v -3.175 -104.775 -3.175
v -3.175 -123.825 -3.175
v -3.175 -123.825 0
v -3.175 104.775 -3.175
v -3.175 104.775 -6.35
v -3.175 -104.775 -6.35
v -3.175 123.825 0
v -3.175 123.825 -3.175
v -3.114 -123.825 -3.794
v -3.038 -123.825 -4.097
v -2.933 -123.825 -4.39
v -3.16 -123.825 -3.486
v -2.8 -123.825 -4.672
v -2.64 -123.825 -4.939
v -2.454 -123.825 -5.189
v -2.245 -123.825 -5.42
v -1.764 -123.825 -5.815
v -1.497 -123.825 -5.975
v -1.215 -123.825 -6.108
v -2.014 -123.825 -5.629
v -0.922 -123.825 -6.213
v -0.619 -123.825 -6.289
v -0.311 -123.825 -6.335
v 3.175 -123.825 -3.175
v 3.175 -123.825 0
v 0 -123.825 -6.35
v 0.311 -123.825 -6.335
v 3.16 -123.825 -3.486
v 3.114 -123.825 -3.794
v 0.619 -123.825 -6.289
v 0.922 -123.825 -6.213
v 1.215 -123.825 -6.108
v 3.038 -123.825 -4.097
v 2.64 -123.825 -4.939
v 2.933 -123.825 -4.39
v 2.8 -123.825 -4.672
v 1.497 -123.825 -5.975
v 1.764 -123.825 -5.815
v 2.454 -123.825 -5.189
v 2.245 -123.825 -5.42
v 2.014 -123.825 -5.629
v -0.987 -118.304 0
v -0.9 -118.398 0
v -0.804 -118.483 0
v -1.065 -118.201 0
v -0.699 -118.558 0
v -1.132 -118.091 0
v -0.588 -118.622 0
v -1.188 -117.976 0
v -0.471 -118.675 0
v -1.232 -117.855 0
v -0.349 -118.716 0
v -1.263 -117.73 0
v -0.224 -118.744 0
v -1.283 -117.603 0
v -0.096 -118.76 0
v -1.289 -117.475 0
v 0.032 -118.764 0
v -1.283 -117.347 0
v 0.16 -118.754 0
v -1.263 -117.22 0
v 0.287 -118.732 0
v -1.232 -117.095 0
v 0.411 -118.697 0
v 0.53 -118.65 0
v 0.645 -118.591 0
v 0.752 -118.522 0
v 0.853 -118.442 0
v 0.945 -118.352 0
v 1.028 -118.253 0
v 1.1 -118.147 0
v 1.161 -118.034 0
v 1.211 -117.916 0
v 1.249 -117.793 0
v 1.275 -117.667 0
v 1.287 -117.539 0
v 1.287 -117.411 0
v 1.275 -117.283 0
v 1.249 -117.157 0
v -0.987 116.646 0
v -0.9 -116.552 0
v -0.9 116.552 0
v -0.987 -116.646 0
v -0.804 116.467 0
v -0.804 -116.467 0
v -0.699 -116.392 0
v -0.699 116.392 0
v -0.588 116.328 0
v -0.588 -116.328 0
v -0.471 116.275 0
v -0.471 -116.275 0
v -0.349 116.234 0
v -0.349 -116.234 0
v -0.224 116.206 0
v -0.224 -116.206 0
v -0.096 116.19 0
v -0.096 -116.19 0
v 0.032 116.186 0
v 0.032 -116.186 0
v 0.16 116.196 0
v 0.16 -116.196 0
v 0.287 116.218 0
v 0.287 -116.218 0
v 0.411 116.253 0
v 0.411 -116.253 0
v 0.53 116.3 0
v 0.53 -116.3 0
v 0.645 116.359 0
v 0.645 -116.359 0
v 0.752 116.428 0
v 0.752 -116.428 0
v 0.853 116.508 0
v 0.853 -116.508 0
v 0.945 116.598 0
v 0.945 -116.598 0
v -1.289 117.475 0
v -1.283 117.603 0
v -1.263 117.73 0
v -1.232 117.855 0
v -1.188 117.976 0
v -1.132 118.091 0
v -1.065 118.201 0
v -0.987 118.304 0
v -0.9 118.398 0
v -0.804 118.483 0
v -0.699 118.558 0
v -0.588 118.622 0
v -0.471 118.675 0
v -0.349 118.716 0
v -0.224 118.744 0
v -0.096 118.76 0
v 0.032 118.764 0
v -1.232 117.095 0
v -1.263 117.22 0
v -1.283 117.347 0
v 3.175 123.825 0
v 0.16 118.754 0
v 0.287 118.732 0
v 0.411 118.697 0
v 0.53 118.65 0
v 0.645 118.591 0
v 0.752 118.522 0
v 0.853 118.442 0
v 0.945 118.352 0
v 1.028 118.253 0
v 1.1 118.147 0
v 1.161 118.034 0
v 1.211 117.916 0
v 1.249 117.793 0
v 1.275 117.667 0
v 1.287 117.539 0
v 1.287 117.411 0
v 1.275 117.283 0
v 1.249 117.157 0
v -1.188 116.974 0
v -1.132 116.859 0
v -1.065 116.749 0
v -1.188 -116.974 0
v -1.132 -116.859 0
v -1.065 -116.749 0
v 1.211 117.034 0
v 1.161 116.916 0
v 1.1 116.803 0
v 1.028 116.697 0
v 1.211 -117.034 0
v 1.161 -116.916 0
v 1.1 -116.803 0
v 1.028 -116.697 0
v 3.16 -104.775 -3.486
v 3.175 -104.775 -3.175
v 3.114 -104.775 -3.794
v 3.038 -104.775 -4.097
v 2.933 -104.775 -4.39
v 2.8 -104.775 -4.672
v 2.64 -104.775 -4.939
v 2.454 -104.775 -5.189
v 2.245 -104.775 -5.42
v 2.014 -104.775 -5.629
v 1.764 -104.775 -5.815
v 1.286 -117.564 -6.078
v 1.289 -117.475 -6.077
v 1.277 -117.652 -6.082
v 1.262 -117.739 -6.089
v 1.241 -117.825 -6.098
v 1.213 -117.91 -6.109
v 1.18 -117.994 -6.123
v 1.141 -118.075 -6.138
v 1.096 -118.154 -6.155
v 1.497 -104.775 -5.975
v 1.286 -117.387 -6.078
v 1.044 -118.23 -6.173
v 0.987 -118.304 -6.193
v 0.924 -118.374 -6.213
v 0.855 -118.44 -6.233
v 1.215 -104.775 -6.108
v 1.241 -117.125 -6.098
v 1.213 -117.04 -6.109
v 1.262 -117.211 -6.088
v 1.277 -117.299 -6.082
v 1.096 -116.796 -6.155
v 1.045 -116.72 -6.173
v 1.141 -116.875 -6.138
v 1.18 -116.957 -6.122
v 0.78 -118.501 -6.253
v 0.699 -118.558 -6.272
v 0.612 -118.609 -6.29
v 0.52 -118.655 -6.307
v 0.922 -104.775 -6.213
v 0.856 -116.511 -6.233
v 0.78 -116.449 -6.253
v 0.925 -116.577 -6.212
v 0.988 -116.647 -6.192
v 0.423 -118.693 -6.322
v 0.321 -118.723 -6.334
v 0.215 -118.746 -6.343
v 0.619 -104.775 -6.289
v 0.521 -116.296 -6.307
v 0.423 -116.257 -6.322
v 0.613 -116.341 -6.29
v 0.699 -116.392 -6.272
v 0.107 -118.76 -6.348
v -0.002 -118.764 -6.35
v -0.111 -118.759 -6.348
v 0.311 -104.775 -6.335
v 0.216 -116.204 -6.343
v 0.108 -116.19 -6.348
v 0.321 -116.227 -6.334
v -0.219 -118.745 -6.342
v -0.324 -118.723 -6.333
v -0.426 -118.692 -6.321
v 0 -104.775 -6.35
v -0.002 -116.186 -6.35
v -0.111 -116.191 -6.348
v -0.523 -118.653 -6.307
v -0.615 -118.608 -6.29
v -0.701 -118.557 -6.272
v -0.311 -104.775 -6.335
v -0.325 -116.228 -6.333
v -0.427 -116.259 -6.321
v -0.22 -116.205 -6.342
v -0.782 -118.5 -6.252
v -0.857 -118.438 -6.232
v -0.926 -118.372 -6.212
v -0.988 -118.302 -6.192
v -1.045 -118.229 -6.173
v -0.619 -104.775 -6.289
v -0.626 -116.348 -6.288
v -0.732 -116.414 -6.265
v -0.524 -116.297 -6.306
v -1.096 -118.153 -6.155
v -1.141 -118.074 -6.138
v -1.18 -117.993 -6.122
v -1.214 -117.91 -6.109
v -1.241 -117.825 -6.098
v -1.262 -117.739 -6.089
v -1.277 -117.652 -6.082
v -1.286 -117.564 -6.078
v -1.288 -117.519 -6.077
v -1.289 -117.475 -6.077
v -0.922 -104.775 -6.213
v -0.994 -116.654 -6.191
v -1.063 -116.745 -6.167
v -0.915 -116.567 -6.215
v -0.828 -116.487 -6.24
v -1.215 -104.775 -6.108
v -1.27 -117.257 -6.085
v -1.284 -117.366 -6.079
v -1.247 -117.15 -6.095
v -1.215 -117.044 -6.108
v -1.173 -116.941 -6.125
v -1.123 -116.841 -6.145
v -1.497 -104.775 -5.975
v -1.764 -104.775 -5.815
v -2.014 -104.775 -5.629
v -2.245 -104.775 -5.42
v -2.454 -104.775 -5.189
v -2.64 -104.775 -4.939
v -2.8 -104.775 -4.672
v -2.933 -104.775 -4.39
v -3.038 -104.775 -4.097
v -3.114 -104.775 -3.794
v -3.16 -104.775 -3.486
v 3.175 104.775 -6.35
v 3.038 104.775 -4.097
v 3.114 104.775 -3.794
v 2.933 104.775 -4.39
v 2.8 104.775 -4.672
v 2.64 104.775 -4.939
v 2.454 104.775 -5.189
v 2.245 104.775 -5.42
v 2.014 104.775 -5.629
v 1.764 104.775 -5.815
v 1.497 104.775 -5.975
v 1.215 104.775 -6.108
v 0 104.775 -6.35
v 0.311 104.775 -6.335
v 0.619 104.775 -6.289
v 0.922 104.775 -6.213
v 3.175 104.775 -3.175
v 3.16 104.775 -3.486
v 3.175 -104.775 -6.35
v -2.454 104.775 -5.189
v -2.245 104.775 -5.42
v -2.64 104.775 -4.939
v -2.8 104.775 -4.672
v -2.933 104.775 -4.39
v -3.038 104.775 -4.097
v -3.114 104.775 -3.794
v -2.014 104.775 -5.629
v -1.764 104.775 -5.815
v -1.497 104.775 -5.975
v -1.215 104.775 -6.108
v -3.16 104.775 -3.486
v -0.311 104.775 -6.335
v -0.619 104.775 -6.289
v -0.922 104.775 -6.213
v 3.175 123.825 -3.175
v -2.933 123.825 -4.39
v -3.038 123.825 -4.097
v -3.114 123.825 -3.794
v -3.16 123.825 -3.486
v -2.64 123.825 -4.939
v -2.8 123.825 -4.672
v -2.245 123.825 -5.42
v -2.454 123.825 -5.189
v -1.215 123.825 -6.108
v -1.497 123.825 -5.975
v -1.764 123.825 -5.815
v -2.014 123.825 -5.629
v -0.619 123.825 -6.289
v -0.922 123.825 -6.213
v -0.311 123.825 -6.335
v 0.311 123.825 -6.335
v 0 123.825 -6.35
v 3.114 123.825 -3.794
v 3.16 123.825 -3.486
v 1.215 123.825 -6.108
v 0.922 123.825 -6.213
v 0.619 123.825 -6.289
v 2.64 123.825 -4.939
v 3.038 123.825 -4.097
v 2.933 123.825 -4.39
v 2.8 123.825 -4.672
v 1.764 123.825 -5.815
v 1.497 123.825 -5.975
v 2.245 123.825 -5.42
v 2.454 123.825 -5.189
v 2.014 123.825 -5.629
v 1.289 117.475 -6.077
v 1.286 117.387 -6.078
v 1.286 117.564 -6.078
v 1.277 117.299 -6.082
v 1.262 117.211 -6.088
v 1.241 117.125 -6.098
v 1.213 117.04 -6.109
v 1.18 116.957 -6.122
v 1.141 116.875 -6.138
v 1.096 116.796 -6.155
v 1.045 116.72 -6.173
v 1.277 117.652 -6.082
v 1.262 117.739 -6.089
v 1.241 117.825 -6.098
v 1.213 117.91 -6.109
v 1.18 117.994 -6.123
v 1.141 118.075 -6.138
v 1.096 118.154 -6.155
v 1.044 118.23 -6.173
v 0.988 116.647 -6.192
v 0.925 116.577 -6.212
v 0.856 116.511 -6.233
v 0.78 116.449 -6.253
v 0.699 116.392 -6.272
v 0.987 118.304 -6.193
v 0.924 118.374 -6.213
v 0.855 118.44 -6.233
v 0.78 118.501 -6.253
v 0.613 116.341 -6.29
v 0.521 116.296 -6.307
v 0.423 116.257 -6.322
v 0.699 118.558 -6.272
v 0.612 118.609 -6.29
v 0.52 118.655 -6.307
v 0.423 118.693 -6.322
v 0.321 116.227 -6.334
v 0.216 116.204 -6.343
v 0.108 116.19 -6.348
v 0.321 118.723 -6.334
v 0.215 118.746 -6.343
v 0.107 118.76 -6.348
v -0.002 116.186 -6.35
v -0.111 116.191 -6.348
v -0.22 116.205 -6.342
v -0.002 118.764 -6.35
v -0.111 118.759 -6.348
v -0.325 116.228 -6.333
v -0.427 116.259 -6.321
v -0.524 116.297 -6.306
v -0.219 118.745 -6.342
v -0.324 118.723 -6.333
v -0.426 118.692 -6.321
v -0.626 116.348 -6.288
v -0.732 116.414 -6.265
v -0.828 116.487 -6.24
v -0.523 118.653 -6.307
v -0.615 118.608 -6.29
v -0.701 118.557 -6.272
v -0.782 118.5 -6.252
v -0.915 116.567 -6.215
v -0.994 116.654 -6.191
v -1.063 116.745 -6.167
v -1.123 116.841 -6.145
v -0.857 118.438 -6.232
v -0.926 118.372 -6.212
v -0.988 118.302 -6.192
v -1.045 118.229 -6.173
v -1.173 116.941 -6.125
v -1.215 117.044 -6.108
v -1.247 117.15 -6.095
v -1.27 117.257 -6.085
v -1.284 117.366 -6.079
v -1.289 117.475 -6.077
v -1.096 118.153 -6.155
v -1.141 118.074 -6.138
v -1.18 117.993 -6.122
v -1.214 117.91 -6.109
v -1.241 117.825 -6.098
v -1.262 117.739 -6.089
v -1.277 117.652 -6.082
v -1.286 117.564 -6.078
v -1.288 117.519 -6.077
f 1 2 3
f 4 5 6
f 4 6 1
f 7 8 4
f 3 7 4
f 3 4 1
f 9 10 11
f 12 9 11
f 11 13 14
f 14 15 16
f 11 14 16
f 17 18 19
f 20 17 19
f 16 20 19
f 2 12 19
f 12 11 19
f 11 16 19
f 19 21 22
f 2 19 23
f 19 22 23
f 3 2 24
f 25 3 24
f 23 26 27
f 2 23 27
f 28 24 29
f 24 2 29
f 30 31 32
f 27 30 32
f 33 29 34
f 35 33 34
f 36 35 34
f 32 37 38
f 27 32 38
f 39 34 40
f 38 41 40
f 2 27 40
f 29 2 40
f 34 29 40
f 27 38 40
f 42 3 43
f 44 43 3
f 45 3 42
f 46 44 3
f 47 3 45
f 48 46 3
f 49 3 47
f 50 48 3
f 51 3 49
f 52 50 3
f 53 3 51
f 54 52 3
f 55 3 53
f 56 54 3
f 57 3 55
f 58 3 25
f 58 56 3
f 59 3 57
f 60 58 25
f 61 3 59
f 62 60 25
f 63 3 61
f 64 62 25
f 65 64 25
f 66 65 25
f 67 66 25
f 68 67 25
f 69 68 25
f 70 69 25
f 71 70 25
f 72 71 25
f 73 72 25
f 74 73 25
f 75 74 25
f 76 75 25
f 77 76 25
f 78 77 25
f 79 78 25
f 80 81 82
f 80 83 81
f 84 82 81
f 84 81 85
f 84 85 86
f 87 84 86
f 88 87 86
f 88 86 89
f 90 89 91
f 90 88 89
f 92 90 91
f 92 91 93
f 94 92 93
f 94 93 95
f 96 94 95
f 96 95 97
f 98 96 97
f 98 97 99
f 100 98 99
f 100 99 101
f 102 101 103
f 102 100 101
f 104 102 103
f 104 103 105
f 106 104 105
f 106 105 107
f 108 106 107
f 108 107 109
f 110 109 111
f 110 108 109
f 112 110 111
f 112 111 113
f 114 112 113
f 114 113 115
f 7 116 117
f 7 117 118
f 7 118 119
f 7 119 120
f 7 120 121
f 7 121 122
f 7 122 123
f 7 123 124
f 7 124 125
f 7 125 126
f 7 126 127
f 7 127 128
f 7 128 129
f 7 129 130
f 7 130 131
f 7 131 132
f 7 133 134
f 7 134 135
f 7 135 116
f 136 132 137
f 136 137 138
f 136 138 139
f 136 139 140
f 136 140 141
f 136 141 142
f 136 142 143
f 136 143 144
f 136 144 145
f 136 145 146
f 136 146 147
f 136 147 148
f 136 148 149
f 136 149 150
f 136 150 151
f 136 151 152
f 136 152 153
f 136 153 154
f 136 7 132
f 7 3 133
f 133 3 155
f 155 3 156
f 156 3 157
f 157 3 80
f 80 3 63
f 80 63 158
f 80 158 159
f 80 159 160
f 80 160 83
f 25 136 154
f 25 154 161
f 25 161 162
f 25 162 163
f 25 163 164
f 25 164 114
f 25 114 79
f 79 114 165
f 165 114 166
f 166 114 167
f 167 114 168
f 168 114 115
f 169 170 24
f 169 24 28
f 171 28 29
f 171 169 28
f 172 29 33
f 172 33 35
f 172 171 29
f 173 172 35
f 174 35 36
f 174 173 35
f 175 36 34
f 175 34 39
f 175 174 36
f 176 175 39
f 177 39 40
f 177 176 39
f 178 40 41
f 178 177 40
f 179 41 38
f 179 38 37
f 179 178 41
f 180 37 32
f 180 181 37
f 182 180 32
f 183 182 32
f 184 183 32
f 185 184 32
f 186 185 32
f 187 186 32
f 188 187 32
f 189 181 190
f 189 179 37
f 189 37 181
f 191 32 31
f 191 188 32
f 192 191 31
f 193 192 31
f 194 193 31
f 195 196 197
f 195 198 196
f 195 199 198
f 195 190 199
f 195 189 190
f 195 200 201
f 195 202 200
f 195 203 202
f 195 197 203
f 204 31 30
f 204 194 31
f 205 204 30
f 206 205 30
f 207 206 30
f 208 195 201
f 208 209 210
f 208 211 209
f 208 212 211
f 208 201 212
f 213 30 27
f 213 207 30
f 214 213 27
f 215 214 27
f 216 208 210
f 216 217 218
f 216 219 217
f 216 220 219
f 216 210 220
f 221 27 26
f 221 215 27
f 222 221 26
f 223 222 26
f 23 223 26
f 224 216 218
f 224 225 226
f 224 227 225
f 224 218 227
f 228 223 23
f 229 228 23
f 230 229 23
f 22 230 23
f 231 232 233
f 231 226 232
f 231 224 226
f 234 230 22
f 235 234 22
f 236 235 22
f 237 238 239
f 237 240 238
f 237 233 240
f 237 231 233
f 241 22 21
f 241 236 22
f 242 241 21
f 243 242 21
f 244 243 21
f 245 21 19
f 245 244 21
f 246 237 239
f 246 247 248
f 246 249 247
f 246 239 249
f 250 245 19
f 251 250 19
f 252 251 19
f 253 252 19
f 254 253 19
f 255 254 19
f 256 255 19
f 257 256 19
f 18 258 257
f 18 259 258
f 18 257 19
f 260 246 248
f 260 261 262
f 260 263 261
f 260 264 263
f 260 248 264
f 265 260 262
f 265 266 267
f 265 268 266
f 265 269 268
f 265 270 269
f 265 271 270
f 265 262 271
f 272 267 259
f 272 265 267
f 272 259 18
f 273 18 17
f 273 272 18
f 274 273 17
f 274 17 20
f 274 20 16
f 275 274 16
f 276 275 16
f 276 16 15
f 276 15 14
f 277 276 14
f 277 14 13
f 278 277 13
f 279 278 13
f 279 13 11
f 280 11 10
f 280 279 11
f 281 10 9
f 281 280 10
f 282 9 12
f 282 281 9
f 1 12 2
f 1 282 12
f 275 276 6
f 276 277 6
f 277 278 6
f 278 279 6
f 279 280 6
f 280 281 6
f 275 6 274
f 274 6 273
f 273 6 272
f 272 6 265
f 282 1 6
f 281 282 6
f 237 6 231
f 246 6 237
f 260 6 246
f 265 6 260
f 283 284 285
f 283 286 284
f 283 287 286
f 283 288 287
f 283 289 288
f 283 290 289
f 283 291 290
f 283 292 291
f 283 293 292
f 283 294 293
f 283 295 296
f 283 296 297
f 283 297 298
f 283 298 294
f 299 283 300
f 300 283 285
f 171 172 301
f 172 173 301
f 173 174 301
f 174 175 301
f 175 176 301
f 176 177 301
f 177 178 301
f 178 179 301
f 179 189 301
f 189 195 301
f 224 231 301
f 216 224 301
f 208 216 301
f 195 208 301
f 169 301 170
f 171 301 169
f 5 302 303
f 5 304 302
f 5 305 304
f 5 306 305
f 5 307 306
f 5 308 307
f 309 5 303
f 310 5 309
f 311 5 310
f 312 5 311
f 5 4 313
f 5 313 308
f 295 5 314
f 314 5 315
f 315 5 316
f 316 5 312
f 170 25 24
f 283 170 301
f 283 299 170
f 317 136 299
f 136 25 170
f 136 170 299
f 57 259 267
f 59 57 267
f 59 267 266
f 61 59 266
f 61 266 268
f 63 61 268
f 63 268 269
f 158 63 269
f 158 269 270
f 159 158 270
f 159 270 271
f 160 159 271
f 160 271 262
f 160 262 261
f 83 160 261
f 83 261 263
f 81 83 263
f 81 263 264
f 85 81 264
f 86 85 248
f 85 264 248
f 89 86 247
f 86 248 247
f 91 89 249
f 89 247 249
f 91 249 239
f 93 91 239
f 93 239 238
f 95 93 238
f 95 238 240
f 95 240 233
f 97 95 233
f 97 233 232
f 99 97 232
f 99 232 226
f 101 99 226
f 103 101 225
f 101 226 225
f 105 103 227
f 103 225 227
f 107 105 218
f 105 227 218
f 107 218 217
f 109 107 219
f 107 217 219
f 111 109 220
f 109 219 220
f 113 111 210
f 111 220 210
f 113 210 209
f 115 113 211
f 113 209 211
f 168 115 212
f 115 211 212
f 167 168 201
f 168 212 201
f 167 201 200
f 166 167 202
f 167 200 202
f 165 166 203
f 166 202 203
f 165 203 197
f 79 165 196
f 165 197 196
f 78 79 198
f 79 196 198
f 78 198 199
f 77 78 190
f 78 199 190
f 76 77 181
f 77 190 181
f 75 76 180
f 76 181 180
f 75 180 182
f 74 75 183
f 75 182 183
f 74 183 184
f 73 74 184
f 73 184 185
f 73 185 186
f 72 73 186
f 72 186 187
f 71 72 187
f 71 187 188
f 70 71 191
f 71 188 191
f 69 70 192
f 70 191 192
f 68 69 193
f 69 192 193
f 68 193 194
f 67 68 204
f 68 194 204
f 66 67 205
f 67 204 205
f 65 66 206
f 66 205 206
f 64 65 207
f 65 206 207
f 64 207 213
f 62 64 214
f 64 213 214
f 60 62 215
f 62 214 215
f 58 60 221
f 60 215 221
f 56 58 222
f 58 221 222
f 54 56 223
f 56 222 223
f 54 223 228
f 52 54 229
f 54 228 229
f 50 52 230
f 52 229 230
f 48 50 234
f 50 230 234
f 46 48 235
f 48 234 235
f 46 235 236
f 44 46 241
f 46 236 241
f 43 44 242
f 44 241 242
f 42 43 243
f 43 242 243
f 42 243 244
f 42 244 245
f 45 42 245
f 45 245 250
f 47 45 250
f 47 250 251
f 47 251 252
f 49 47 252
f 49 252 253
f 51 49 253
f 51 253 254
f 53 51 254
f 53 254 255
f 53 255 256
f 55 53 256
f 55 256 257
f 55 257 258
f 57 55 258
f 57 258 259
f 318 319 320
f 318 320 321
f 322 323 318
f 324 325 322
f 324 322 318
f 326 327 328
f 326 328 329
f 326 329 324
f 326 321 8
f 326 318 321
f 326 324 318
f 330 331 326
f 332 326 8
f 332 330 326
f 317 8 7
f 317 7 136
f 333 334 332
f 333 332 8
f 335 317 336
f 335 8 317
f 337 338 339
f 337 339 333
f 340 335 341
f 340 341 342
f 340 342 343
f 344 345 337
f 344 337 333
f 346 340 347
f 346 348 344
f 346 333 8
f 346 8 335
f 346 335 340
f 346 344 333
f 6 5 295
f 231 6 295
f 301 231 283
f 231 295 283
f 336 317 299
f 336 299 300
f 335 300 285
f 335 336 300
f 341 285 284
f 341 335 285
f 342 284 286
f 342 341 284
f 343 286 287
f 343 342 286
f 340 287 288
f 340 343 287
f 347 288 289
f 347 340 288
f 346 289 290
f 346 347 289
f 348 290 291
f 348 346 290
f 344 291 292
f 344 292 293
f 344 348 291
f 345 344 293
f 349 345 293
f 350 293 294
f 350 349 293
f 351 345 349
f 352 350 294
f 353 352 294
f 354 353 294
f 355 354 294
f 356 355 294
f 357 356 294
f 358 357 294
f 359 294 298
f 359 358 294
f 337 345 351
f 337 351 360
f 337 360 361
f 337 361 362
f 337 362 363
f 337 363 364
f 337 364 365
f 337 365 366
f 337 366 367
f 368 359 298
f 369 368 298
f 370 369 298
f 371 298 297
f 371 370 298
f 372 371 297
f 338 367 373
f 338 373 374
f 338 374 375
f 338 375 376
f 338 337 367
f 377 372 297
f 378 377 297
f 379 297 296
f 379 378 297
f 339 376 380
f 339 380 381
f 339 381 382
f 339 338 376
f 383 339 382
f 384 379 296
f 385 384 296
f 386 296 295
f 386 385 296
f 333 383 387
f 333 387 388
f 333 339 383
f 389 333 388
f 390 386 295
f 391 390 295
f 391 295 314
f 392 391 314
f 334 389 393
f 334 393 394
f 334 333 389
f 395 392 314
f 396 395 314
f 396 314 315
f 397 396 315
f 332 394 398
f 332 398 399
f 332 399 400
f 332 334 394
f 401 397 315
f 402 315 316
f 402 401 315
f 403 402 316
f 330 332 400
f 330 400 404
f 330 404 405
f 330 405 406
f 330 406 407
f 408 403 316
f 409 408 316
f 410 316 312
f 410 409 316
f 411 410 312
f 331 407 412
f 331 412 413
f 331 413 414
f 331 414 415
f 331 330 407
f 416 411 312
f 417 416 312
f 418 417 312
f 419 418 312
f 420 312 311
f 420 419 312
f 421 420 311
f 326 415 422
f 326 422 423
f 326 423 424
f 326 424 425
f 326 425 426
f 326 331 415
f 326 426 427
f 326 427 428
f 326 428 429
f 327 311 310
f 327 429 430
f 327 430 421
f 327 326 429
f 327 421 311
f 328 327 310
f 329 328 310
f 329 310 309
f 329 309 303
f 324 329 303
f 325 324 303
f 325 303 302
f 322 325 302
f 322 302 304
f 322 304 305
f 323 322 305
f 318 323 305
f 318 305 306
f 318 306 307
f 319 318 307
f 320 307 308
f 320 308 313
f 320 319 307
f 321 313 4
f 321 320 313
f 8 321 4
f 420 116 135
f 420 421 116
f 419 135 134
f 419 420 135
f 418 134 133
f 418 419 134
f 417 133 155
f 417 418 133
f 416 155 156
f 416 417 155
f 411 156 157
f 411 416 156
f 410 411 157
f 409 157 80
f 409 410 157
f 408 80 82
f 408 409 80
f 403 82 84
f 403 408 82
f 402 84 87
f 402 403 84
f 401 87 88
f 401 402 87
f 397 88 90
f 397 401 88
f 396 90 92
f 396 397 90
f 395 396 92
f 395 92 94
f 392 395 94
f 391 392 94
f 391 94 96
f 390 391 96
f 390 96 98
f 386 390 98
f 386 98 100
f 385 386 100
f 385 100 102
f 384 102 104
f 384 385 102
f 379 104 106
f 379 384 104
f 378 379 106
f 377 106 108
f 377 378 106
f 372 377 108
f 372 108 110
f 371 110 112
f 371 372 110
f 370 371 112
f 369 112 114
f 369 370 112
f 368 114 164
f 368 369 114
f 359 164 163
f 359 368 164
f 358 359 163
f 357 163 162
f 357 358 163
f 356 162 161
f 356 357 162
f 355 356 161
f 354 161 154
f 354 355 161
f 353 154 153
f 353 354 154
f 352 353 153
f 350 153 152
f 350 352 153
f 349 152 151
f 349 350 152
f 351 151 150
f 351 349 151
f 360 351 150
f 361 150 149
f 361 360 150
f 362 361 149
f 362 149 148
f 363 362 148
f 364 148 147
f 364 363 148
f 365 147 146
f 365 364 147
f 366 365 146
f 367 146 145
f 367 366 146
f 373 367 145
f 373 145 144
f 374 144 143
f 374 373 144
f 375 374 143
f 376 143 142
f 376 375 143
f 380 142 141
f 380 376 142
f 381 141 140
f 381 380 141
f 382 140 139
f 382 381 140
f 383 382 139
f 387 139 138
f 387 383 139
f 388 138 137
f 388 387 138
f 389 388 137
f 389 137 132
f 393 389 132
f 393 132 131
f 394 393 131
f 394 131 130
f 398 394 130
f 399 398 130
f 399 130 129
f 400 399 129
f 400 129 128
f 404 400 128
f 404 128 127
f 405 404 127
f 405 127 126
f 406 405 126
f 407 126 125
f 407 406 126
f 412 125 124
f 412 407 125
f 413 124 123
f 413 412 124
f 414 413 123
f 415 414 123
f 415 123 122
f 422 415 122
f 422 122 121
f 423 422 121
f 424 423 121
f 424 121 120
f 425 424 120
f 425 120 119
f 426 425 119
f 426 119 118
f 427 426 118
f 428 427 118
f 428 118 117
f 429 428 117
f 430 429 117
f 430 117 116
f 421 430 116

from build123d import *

# Parameters (mm, degrees)
BOSS_EXTRUDE1_DEPTH   = 123.825
F_5_40_TAPPED_HOLE1_D = 2.5781
BOSS_EXTRUDE2_START   = -19.05
SKETCH4_W             = 6.35
SKETCH4_H             = 6.35
BOSS_EXTRUDE2_DEPTH   = 209.55


with BuildPart() as part:
    # Sketch1 → Boss-Extrude1 (new, symmetric)
    with BuildSketch(Plane(origin=(0, 0, 0), x_dir=(1, 0, 0), z_dir=(0, 1, 0))):
        with BuildLine():
            Line((-3.175, 3.175), (-3.175, 0))
            Line((-3.175, 0), (3.175, 0))
            Line((3.175, 0), (3.175, 3.175))
            ThreePointArc((3.175, 3.175), (0, 6.35), (-3.175, 3.175))
        make_face()
    extrude(amount=BOSS_EXTRUDE1_DEPTH, both=True)

    # #5-40 Tapped Hole1 (through all)
    with Locations(Plane.XY):
        with Locations((0, -117.475)):
            f_5_40_tapped_hole1 = Hole(F_5_40_TAPPED_HOLE1_D / 2)

    # Mirror1: #5-40 Tapped Hole1 across plane
    add(f_5_40_tapped_hole1.mirror(Plane.ZX), mode=Mode.SUBTRACT)

    # Sketch4 → Boss-Extrude2 (add)
    with BuildSketch(Plane(origin=(0, 123.825, 0), x_dir=(1, 0, 0), z_dir=(0, 1, 0)).offset(BOSS_EXTRUDE2_START)):
        with Locations((0, 3.175)):
            Rectangle(SKETCH4_W, SKETCH4_H)
    extrude(amount=-BOSS_EXTRUDE2_DEPTH)


solid = part.part
